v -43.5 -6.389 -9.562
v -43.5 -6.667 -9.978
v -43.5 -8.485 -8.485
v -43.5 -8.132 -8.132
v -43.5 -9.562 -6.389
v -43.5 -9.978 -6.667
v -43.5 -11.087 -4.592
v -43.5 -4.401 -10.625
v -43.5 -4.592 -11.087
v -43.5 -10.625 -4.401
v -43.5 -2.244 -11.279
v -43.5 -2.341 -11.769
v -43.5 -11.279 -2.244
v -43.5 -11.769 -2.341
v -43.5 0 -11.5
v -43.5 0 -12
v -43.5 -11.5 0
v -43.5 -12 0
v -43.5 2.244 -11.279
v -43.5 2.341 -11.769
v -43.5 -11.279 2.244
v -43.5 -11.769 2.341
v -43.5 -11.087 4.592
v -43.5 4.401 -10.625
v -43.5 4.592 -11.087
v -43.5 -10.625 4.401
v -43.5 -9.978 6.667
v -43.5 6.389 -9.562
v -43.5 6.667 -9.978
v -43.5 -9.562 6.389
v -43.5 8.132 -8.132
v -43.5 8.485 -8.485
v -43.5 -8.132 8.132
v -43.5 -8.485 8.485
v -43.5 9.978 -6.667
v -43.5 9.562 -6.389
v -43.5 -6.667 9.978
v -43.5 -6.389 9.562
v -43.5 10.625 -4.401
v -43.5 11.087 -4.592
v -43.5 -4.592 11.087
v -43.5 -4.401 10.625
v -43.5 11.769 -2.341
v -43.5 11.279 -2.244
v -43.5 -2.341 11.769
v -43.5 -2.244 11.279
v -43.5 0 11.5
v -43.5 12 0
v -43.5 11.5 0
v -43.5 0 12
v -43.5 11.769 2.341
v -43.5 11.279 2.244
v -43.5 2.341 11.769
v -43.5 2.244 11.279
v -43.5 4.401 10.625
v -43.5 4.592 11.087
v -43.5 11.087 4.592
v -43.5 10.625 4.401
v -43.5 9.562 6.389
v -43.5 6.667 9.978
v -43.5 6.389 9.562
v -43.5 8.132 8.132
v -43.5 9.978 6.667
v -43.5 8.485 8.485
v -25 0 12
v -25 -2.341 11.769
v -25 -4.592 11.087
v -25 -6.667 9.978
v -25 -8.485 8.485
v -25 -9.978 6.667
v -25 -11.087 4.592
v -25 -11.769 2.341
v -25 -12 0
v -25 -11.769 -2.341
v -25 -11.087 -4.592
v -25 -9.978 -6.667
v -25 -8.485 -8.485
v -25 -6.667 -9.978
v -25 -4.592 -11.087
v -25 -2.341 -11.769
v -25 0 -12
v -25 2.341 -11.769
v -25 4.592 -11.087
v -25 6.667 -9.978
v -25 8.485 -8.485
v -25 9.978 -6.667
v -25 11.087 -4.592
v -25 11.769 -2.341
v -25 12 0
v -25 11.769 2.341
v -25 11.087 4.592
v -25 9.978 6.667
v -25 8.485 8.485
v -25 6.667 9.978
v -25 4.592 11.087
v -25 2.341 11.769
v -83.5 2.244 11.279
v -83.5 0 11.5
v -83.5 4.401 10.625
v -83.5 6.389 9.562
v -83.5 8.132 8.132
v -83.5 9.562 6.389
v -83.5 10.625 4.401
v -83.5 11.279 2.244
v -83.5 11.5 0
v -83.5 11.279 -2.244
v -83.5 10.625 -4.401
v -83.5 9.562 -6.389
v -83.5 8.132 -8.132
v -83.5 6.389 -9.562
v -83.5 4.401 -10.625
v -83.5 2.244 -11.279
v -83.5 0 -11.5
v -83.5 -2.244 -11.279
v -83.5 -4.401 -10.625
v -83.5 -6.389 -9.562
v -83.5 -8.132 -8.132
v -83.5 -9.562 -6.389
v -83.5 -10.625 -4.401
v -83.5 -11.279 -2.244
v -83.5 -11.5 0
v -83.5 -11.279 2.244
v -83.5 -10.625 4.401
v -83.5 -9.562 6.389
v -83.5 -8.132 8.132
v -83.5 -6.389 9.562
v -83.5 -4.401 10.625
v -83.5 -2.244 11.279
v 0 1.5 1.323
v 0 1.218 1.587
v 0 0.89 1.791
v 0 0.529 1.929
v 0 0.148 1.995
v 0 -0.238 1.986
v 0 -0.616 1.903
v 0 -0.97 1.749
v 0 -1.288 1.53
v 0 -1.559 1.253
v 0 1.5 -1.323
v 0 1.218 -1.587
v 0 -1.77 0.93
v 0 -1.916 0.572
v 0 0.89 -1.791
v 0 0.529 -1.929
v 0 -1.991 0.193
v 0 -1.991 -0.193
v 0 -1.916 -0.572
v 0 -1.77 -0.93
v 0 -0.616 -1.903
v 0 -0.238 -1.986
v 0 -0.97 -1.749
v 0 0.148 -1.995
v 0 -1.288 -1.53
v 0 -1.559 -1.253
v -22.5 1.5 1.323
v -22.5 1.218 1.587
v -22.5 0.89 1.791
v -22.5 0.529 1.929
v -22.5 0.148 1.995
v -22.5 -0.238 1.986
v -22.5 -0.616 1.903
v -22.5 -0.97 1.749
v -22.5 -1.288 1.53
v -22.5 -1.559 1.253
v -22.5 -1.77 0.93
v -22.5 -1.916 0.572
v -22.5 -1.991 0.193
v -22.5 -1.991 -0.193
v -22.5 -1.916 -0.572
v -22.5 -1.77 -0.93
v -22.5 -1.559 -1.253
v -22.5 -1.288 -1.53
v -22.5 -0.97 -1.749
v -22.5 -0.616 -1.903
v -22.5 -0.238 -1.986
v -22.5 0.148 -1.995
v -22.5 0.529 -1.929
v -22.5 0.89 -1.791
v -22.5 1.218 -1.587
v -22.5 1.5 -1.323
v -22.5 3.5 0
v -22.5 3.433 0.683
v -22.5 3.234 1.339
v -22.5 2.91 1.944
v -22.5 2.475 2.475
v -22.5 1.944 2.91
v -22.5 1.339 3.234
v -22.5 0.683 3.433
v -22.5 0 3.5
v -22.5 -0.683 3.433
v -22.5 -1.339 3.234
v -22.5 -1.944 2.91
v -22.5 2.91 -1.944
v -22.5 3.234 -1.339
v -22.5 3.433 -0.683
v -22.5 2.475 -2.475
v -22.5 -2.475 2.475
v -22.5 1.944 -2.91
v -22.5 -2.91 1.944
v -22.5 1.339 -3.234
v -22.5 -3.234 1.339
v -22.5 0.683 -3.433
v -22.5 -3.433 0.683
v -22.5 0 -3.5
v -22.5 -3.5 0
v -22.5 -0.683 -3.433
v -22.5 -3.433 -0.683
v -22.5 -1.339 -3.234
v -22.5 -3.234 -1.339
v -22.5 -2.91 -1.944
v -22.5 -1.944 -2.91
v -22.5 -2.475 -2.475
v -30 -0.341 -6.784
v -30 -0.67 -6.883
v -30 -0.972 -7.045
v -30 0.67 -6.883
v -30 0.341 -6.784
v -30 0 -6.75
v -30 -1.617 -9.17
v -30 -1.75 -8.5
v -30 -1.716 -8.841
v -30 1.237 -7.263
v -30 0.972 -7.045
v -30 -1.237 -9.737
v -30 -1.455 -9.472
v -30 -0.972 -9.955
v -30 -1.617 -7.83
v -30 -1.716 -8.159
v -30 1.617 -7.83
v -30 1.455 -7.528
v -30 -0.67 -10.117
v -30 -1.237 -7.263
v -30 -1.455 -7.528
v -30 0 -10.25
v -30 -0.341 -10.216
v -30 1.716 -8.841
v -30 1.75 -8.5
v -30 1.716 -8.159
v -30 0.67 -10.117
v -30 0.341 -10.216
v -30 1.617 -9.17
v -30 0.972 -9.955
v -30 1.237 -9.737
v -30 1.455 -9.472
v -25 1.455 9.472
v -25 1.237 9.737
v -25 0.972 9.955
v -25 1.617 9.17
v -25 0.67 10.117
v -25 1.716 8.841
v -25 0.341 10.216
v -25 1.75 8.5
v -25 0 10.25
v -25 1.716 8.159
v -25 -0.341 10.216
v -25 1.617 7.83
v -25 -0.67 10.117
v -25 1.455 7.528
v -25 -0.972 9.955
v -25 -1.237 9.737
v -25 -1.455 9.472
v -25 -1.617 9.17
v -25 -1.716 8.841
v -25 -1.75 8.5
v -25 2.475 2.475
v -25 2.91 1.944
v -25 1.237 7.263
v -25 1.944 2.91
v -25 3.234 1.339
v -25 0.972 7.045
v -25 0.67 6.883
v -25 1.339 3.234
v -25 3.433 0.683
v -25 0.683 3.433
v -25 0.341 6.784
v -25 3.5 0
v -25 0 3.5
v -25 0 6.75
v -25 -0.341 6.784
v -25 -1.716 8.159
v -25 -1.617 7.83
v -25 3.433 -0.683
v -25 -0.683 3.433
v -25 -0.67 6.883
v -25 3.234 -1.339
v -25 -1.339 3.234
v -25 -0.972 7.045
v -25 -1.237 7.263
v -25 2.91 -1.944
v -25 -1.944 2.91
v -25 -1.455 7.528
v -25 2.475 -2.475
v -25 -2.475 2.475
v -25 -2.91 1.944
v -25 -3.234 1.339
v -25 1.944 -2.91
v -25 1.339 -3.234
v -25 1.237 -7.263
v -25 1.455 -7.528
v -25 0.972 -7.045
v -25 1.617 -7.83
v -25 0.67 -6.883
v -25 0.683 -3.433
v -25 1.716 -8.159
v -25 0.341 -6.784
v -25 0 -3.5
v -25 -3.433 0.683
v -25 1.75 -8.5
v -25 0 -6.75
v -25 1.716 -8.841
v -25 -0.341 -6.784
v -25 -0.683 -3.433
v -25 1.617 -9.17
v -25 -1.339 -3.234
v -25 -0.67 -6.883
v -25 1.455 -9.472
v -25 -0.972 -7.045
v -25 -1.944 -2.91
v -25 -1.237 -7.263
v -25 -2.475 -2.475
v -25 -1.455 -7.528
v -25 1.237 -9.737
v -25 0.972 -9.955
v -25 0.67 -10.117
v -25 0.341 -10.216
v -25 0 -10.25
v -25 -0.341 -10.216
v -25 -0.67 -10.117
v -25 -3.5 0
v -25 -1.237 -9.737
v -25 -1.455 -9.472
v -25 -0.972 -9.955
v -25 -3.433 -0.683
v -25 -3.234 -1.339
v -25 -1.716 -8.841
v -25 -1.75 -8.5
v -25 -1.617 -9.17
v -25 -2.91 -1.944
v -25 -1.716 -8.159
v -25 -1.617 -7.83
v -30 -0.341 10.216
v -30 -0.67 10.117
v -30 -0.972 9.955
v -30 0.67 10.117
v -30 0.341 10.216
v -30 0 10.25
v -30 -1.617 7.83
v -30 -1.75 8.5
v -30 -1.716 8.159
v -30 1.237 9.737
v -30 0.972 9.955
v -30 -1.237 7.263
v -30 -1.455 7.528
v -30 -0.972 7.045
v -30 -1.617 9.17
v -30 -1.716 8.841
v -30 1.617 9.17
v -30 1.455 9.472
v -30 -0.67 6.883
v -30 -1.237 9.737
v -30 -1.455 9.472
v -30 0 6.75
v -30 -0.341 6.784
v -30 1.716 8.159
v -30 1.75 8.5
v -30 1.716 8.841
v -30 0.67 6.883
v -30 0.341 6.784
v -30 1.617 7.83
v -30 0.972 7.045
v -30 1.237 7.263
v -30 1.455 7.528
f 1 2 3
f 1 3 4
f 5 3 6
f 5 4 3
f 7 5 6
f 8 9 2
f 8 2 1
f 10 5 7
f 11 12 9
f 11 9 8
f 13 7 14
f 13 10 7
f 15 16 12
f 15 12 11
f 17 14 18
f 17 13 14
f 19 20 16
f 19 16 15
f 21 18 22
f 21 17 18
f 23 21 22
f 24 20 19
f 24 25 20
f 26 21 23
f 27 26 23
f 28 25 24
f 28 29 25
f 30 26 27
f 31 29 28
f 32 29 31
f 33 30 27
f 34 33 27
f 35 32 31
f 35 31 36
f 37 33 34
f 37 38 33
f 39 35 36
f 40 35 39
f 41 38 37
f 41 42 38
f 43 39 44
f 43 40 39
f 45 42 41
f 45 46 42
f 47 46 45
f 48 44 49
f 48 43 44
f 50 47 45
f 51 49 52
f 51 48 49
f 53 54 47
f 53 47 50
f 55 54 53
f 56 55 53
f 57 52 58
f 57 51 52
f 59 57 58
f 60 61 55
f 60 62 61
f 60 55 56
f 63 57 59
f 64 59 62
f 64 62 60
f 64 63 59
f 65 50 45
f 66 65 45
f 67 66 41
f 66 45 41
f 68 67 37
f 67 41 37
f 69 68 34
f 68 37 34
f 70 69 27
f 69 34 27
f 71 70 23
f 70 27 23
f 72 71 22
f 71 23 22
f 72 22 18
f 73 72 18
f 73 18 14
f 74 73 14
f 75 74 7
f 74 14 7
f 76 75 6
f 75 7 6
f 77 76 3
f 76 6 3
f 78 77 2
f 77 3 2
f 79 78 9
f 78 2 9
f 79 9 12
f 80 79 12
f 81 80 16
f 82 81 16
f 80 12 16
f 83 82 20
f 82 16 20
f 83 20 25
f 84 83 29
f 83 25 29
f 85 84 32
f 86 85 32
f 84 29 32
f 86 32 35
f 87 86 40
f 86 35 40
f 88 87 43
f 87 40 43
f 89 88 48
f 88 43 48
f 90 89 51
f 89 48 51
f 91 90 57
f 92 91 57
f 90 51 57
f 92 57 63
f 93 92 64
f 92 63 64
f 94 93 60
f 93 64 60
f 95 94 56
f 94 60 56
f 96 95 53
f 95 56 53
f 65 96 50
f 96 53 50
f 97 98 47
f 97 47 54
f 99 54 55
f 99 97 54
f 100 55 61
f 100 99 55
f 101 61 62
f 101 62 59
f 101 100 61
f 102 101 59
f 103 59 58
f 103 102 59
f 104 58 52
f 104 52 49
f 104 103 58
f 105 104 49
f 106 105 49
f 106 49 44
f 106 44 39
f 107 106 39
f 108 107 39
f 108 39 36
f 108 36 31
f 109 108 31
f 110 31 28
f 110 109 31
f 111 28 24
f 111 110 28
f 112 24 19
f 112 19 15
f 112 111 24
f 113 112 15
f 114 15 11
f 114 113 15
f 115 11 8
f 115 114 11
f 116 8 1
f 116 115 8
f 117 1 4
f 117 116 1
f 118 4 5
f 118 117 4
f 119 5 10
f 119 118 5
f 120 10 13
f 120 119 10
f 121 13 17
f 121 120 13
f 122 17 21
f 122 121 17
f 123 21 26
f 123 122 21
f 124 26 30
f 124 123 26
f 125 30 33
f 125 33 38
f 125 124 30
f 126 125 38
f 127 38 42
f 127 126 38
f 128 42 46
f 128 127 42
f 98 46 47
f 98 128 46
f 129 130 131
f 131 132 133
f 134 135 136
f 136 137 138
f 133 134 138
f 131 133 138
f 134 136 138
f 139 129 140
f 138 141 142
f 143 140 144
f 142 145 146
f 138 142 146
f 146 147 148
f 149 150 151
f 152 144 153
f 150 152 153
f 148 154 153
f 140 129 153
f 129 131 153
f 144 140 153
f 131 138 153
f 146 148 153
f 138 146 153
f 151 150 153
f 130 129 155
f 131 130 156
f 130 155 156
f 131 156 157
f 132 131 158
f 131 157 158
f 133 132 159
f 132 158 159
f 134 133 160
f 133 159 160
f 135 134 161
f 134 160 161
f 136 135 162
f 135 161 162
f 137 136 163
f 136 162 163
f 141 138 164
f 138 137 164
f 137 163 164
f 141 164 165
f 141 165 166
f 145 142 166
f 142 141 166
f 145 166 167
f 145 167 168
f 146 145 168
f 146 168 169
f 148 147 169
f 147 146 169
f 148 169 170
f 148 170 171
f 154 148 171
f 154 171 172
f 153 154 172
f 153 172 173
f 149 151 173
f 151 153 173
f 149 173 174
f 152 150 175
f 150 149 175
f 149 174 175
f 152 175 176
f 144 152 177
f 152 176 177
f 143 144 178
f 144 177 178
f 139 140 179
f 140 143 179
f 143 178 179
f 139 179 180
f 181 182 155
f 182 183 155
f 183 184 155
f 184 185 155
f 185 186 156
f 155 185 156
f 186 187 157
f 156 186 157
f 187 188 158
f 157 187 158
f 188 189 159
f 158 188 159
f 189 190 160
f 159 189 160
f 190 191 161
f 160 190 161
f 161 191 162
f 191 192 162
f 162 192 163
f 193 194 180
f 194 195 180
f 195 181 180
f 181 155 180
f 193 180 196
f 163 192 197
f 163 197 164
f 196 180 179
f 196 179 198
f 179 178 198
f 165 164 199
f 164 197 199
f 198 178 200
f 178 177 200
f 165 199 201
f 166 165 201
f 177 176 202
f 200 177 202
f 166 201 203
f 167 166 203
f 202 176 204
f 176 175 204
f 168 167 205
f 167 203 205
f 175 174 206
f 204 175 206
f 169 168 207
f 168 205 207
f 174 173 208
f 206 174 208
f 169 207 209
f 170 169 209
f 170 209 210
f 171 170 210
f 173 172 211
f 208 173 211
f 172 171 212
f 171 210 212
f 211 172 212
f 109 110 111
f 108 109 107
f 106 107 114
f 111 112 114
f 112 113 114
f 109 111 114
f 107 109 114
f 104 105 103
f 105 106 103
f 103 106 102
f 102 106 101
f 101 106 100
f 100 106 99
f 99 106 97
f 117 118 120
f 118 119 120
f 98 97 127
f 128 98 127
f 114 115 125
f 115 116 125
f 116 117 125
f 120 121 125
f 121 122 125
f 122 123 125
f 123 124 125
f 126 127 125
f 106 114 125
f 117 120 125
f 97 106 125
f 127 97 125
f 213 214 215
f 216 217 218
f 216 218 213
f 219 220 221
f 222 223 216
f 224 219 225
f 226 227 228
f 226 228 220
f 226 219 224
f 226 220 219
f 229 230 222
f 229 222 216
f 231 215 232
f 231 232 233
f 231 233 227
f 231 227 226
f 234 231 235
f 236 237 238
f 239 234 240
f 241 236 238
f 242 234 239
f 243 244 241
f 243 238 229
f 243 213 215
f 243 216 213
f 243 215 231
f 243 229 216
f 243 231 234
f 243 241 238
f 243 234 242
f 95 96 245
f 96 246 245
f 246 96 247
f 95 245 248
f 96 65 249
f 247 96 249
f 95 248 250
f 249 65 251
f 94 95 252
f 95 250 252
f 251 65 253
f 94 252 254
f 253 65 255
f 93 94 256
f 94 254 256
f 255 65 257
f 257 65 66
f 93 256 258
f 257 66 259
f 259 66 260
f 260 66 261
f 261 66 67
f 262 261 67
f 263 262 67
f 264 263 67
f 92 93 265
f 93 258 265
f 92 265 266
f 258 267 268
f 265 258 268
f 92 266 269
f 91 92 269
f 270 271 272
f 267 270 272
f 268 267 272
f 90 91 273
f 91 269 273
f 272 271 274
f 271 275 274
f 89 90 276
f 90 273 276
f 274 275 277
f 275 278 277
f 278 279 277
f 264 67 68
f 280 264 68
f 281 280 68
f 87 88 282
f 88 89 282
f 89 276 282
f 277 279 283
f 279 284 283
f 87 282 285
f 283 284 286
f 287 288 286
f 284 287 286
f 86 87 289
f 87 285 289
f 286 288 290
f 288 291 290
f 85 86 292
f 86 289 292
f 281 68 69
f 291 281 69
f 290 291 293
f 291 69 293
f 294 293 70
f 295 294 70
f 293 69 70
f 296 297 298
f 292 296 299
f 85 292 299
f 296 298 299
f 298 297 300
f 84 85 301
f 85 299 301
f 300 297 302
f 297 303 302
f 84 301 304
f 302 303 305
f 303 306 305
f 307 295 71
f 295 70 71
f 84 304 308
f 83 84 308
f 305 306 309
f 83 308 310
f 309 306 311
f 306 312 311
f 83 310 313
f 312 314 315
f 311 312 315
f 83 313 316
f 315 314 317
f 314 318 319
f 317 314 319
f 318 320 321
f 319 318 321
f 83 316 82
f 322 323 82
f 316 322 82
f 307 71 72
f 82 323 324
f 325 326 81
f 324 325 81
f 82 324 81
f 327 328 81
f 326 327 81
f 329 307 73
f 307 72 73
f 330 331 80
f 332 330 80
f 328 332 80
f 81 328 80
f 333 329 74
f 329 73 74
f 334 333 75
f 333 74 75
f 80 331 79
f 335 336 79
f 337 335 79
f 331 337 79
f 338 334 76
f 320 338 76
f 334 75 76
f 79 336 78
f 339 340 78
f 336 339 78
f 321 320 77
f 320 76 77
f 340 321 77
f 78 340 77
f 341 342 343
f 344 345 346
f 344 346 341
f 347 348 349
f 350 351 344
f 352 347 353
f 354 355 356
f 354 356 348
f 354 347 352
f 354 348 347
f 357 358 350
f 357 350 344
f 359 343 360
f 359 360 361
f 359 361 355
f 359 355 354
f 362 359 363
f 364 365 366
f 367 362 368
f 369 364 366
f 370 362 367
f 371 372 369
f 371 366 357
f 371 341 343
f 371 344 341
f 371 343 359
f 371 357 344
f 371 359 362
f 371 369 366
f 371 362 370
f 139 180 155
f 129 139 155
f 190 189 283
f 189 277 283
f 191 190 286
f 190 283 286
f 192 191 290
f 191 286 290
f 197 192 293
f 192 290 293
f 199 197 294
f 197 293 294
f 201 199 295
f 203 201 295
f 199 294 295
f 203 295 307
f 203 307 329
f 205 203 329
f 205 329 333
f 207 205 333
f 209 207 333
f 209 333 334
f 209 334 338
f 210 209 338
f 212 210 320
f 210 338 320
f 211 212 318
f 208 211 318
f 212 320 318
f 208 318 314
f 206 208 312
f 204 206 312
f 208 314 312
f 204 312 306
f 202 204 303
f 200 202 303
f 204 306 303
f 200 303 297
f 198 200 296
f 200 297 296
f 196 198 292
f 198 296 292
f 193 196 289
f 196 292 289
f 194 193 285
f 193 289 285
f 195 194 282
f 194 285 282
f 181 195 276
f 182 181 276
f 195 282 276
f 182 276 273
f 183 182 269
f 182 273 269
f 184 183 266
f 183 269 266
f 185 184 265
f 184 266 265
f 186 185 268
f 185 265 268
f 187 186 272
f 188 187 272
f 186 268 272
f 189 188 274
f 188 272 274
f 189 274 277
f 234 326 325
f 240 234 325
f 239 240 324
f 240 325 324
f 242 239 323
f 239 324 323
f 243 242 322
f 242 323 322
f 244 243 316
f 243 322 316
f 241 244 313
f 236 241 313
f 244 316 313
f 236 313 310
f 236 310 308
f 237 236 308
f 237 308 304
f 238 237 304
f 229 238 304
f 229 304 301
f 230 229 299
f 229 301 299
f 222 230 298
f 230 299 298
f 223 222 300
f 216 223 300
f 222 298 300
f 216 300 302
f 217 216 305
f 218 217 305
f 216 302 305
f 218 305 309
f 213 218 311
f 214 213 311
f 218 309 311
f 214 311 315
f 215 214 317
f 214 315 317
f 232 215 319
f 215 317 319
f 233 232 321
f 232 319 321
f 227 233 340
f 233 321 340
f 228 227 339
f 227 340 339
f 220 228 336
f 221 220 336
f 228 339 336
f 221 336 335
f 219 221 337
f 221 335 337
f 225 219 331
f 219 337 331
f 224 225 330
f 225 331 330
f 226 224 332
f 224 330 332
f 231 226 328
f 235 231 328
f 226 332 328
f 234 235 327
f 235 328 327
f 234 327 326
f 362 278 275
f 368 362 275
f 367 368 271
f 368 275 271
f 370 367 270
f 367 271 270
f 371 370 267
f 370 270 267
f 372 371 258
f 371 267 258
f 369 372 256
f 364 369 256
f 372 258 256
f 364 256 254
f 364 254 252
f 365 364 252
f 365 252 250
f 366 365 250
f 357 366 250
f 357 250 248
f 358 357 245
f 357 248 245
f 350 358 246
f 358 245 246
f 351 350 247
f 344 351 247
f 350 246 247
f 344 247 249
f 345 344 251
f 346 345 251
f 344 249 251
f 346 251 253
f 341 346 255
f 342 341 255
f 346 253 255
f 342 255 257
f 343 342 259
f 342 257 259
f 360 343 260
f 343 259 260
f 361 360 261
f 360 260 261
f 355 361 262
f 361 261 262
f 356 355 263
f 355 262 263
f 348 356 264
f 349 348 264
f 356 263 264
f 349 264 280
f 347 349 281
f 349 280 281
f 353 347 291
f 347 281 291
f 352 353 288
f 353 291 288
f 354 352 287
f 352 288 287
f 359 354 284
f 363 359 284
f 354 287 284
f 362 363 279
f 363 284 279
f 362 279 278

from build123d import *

# Parameters (mm, degrees)
CUT_EXTRUDE1_START = -22.5
CUT_EXTRUDE1_DEPTH = 22.5
SKETCH4_R          = 1.75
CUT_EXTRUDE2_DEPTH = 5
SKETCH5_R          = 12
SKETCH5_R_2        = 11.5
CUT_EXTRUDE3_DEPTH = 40


with BuildPart() as part:
    # Sketch1 → Revolve1 (revolve)
    with BuildSketch(Plane(origin=(0, 0, 0), x_dir=(1, 0, 0), z_dir=(0, 1, 0)), mode=Mode.PRIVATE) as revolve1_sk:
        Polygon((-25, 12), (-83.5, 12), (-83.5, 0), (0, 0), (0, 2), (-22.5, 2), (-22.5, 3.5), (-25, 3.5), align=None)
    revolve(revolve1_sk.sketch.rotate(Axis((-83.5, 0, 0), (1, 0, 0)), 180), axis=Axis((-83.5, 0, 0), (1, 0, 0)))

    # Sketch2 → Cut-Extrude1 (cut)
    with BuildSketch(Plane(origin=(0, 0, 0), x_dir=(0, 0, -1), z_dir=(1, 0, 0)).offset(CUT_EXTRUDE1_START)):
        with BuildLine():
            Line((1.322875656, 1.5), (-1.322875656, 1.5))
            ThreePointArc((-1.322875656, 1.5), (0, 2), (1.322875656, 1.5))
        make_face()
    extrude(amount=CUT_EXTRUDE1_DEPTH, mode=Mode.SUBTRACT)

    # Sketch4 → Cut-Extrude2 (cut)
    with BuildSketch(Plane(origin=(-25, 0, 0), x_dir=(0, 0, -1), z_dir=(1, 0, 0))):
        with Locations((-8.5, 0)):
            Circle(SKETCH4_R)
        with Locations((8.5, 0)):
            Circle(SKETCH4_R)
    extrude(amount=-CUT_EXTRUDE2_DEPTH, mode=Mode.SUBTRACT)

    # Sketch5 → Cut-Extrude3 (cut)
    with BuildSketch(Plane.ZY.offset(83.5)):
        Circle(SKETCH5_R)
        Circle(SKETCH5_R_2, mode=Mode.SUBTRACT)
    extrude(amount=-CUT_EXTRUDE3_DEPTH, mode=Mode.SUBTRACT)


solid = part.part
